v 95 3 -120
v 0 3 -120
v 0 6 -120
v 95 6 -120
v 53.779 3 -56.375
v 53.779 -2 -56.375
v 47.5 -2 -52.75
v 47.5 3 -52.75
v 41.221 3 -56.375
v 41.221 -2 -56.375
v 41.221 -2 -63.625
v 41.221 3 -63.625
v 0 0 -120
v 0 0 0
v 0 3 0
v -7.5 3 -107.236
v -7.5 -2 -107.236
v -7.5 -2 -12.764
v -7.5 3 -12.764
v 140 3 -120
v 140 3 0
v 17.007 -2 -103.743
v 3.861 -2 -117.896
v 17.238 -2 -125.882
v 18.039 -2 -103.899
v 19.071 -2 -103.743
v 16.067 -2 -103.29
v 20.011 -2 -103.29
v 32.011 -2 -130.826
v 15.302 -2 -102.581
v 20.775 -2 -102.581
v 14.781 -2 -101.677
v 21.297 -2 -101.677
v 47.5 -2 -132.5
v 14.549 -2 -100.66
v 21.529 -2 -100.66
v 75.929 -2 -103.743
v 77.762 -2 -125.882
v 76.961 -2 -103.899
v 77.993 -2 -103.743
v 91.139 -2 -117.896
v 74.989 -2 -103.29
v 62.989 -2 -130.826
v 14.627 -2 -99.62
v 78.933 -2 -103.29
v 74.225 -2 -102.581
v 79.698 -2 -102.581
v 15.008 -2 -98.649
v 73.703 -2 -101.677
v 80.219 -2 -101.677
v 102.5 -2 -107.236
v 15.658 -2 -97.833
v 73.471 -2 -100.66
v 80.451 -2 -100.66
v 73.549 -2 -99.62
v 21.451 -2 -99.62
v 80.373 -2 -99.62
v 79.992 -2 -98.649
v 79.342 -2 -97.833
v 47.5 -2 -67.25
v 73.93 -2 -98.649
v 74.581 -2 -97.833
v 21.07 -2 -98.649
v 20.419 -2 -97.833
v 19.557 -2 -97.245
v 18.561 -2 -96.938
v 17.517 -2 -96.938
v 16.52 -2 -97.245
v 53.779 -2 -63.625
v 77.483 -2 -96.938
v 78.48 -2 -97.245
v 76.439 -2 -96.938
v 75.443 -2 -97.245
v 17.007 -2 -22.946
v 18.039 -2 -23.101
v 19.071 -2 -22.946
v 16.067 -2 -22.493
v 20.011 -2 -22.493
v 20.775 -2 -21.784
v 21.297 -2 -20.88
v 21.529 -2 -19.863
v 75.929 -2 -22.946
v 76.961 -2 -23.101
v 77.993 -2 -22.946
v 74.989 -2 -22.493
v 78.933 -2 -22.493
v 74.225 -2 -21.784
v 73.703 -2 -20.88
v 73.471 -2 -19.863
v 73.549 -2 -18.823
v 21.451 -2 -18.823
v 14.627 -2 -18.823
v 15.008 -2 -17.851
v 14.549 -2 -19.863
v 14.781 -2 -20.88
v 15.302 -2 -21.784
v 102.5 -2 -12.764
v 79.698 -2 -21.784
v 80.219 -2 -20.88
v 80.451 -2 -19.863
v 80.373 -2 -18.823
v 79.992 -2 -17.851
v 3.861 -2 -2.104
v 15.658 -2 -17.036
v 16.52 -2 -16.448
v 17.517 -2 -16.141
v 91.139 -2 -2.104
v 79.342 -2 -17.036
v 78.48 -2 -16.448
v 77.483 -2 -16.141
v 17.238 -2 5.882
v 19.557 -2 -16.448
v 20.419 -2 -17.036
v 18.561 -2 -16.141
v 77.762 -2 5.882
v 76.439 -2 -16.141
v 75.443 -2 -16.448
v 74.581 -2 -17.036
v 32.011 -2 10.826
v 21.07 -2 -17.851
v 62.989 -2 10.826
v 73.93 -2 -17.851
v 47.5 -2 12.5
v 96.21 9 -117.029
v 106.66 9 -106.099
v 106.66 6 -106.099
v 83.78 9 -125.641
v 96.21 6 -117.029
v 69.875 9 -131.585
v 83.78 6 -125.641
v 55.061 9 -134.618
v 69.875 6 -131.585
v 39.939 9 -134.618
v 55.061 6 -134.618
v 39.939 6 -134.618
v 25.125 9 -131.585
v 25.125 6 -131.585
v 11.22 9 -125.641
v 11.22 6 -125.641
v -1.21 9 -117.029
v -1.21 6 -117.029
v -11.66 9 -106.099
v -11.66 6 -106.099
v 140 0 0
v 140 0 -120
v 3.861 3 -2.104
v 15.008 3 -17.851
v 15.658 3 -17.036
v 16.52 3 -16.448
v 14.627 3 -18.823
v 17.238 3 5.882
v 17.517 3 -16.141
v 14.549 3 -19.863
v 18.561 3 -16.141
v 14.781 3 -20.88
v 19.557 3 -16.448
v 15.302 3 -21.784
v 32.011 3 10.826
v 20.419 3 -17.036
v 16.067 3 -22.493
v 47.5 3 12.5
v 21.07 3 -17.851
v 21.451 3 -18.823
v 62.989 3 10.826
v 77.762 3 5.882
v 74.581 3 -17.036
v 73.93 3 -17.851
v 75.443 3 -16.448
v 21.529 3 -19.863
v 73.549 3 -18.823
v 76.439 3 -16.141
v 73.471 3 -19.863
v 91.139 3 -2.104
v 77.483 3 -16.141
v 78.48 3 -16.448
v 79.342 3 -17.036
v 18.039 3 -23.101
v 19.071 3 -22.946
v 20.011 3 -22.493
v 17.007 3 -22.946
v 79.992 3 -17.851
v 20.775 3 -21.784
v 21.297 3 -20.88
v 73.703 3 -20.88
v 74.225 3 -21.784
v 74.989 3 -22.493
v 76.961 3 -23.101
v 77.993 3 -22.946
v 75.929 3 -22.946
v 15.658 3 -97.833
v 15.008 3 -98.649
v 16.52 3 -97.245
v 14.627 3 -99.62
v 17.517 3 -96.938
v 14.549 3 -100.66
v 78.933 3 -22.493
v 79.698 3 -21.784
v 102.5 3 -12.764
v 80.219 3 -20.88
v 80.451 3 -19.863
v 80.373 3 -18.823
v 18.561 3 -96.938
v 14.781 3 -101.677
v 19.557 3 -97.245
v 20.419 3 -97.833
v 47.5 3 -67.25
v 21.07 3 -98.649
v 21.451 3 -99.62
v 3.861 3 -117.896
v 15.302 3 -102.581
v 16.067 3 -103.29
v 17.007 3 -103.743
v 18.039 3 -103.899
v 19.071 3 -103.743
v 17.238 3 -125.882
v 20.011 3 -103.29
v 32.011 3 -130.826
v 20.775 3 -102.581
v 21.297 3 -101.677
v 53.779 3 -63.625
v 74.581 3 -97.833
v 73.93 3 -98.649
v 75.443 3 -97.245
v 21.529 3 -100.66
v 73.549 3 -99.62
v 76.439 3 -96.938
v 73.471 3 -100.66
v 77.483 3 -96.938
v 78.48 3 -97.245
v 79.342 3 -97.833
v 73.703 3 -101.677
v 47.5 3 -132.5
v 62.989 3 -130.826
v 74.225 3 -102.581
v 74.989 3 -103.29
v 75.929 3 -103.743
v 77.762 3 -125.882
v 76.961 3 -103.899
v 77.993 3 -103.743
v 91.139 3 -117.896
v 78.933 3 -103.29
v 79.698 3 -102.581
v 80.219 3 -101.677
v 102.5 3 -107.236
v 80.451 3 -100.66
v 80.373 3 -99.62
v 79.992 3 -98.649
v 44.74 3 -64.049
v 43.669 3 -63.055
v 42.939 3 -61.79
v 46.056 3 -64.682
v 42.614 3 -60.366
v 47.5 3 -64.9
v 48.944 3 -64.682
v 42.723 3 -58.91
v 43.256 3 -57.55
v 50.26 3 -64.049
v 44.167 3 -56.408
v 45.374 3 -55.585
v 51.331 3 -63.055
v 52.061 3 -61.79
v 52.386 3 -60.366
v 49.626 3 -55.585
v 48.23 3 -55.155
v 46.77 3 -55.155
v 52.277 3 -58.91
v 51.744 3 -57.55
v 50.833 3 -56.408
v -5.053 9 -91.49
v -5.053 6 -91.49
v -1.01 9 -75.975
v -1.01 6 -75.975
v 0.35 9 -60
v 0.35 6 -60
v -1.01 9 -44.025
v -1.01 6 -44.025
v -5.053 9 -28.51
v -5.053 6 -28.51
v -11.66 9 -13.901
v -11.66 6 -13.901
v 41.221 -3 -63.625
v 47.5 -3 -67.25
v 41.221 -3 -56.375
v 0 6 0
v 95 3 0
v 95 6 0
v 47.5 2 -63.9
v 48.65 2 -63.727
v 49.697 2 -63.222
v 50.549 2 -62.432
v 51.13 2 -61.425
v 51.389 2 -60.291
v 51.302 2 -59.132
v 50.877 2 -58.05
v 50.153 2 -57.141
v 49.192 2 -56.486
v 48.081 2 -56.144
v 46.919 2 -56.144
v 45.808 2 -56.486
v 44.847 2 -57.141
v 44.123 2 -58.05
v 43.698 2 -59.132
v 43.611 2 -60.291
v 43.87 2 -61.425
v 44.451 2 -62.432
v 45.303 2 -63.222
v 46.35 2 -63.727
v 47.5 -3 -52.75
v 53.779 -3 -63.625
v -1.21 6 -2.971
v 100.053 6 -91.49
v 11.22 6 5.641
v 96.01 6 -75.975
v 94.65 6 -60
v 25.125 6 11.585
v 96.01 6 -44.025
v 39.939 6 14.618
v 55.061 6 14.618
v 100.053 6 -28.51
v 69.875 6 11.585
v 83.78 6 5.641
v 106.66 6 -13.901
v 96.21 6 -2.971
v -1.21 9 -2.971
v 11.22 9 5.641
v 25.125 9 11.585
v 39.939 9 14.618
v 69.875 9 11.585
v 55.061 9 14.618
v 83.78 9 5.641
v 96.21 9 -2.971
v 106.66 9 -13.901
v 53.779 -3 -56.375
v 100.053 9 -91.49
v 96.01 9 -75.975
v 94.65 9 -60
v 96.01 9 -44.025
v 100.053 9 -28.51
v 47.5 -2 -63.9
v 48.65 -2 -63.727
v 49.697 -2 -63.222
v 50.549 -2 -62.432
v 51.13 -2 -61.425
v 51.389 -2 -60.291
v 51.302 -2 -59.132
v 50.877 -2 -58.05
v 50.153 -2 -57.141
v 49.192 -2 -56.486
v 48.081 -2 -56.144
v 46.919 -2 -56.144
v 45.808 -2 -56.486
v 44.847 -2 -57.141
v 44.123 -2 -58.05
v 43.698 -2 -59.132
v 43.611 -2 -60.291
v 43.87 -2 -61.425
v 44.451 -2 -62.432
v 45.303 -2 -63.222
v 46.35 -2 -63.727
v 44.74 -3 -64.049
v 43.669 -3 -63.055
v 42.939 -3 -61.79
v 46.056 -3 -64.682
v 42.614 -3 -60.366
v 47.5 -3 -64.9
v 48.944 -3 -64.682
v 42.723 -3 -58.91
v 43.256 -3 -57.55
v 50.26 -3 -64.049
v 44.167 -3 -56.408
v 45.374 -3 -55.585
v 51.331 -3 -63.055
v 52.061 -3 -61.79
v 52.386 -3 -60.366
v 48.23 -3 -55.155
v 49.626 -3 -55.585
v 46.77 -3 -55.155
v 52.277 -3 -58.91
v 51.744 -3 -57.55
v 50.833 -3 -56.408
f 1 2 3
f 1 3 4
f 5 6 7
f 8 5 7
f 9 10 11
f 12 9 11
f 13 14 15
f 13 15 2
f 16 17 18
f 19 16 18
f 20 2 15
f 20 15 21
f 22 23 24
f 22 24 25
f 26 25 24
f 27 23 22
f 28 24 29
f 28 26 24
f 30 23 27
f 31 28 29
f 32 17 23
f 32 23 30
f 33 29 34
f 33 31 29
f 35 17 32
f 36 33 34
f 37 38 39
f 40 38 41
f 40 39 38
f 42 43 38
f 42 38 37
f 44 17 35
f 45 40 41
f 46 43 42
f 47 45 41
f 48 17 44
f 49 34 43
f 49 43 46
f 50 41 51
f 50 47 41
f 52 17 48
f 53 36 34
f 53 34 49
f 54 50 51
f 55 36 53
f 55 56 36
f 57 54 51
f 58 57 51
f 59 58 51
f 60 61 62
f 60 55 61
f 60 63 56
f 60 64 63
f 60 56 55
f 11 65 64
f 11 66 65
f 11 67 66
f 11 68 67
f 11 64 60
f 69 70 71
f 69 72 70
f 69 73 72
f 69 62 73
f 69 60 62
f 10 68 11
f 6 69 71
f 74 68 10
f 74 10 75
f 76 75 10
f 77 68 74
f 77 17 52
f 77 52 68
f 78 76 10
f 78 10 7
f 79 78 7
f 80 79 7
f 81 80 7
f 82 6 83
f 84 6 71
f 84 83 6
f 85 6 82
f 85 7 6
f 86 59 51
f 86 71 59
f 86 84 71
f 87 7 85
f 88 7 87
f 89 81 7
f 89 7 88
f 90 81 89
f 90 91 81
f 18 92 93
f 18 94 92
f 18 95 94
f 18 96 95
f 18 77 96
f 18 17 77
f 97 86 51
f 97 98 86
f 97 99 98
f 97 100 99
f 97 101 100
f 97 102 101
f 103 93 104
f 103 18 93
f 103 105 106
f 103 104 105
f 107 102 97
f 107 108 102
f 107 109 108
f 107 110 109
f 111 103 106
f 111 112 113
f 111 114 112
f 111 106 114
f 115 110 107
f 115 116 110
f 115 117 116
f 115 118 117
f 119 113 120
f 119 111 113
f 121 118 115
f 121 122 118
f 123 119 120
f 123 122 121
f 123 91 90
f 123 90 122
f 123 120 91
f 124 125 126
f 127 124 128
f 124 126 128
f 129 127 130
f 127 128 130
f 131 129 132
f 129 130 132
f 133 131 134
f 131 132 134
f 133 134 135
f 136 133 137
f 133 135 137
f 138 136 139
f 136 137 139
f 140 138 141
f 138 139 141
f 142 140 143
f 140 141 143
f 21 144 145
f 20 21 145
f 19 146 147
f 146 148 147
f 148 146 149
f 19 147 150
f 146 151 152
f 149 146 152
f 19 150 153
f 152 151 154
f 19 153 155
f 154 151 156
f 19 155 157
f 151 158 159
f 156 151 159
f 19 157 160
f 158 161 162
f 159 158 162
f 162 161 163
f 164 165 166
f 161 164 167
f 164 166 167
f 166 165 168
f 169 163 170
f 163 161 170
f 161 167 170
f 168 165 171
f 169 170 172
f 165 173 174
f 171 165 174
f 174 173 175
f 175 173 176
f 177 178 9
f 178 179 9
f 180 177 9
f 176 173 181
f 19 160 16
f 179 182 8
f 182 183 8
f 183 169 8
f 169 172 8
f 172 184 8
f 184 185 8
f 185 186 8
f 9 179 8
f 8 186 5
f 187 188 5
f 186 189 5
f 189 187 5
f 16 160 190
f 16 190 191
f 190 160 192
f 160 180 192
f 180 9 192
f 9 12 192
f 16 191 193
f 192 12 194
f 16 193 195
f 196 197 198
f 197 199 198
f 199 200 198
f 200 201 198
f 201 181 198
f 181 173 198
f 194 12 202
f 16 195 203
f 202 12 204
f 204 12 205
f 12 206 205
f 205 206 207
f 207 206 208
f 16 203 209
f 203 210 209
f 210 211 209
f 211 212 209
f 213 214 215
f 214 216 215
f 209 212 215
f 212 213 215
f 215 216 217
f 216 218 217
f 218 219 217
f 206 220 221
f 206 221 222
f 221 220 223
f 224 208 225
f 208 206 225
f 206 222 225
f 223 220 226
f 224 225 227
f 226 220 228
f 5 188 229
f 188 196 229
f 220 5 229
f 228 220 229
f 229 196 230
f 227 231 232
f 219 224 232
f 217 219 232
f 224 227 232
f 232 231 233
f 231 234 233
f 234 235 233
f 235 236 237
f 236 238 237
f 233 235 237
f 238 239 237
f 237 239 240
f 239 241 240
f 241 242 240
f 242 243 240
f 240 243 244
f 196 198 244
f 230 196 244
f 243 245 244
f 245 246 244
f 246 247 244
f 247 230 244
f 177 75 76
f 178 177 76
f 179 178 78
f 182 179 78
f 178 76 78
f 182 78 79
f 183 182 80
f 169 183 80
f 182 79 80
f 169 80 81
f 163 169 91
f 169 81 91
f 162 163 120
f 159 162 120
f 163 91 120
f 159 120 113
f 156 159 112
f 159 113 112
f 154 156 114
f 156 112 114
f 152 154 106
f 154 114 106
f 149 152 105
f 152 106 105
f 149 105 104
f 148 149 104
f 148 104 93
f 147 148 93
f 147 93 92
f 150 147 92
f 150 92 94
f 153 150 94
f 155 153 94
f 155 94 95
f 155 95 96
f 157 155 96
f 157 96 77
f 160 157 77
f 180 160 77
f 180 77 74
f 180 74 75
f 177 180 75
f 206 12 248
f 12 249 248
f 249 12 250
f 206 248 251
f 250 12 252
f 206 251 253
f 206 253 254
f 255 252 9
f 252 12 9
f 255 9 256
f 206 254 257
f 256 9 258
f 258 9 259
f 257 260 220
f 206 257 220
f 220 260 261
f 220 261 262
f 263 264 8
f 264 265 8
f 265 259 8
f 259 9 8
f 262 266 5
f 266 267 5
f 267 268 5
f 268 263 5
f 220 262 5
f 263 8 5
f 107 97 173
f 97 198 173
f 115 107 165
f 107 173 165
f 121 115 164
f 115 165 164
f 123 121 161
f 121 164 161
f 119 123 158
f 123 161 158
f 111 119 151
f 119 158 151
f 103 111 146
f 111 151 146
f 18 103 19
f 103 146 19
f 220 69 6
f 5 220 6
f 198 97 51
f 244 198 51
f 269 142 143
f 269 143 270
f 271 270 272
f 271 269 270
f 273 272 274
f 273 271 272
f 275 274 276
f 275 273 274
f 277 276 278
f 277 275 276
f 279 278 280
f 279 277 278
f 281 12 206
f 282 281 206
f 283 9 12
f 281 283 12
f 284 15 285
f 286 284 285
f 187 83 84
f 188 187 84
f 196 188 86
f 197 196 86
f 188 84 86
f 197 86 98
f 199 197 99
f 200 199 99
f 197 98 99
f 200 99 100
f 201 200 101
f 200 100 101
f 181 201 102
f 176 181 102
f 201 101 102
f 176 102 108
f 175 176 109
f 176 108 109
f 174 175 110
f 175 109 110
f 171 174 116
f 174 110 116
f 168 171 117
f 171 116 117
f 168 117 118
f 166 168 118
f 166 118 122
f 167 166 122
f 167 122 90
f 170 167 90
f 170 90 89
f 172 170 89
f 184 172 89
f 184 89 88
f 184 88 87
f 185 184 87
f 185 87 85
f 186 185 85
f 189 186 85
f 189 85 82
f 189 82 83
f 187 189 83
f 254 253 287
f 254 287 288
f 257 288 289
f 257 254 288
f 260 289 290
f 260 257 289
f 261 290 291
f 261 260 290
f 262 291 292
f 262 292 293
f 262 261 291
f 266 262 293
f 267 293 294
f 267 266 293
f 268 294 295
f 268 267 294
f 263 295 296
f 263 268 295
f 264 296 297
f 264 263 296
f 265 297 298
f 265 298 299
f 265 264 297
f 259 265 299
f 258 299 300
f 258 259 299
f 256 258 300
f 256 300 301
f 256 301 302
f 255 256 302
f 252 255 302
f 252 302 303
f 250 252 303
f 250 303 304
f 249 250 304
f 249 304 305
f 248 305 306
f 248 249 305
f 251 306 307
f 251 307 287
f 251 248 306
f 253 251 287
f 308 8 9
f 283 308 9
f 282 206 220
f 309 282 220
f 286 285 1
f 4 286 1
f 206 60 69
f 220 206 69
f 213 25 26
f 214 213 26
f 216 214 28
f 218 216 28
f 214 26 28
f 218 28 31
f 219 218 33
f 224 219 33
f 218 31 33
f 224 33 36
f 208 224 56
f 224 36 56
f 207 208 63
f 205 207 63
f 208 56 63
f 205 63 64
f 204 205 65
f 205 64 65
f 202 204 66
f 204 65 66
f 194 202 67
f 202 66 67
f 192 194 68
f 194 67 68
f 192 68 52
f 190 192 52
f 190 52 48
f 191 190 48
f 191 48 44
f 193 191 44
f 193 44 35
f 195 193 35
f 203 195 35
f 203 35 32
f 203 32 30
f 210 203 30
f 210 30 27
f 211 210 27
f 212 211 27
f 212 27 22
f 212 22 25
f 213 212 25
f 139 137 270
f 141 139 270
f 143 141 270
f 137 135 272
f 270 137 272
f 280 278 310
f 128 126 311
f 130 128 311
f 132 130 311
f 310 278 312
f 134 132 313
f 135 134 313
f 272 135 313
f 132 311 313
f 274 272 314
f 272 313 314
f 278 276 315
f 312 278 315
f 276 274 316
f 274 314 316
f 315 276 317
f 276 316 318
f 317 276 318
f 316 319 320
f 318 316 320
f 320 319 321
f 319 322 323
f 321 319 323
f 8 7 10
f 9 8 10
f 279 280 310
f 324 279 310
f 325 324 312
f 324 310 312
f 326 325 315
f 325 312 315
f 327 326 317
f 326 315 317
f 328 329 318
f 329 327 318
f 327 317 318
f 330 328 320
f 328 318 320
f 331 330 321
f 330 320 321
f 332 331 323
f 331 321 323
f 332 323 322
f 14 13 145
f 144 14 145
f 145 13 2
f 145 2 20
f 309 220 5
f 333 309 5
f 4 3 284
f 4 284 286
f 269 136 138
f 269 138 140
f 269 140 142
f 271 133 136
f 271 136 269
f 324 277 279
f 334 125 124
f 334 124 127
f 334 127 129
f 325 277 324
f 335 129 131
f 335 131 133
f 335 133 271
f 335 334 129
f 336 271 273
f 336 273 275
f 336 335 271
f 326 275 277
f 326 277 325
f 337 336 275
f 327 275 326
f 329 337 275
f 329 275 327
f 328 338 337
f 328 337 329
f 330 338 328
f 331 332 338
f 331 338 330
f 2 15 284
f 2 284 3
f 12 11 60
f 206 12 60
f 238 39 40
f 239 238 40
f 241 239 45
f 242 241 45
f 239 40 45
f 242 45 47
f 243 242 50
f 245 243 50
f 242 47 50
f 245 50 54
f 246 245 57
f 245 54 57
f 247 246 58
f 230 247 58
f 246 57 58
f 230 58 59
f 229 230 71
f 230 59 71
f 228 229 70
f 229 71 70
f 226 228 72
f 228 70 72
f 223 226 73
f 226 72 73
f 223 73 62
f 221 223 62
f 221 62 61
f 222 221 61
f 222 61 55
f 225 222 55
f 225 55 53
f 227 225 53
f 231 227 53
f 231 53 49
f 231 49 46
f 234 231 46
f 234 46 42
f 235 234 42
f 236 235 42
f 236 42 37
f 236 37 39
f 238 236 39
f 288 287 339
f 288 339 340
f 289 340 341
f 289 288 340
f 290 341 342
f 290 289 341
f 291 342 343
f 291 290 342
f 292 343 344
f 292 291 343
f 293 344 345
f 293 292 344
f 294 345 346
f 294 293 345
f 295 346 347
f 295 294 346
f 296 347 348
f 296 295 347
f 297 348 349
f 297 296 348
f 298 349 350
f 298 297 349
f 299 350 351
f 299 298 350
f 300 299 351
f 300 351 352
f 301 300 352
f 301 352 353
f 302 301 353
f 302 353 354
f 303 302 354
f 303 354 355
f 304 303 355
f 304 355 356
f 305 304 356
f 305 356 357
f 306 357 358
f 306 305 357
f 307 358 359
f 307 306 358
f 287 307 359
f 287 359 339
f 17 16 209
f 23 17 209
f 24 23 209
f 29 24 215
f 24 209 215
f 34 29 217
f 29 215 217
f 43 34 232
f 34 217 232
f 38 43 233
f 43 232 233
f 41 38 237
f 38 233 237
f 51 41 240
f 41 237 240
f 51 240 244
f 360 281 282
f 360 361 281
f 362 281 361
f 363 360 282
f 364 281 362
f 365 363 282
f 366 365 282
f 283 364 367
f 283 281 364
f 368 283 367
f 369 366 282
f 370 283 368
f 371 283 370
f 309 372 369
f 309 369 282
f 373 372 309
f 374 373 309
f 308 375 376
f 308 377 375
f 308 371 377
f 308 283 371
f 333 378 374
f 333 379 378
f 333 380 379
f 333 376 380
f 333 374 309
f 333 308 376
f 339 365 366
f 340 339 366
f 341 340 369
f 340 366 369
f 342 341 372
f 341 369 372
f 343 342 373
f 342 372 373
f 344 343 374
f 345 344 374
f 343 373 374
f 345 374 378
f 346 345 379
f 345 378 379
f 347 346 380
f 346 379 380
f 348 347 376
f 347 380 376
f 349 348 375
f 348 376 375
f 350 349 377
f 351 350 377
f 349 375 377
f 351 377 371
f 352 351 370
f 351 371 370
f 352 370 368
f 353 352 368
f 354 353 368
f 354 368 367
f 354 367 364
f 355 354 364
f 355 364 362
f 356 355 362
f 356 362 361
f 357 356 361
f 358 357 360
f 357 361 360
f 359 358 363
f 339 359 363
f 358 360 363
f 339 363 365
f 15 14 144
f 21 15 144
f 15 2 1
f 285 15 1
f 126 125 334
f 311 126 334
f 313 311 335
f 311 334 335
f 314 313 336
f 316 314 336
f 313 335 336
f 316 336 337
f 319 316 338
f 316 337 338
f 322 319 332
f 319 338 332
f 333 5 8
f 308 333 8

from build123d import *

# Parameters (mm, degrees)
SKETCH1_W                   = 140
SKETCH1_H                   = 120
COMPACT_DEPTH               = 3
SKETCH4_W                   = 95
SKETCH4_H                   = 120
SUPERCOMPACT_DEPTH          = 3
SKETCH7_R                   = 75
APPLE_BASE_DEPTH            = 3
SIDECUTS_DEPTH              = 195.694632694
APPLE_BASE_2_DEPTH          = 3
BOSS_EXTRUDE4_DEPTH         = 3
BASE_PLATE_FILLET_R         = 0.001
TOP_BOTTOM_EXTENSIONS_DEPTH = 3
SKETCH35_R                  = 1.25
SPACERHOLES_DEPTH           = 10
CUT_EXTRUDE4_DEPTH          = 10
SKETCH39_R                  = 72.5
SKETCH39_R_2                = 1.25
BOSS_EXTRUDE5_DEPTH         = 5
CUT_EXTRUDE5_DEPTH          = 150
SKETCH41_R                  = 8.4
CUT_EXTRUDE6_DEPTH          = 10
SKETCH45_R                  = 3.5
CUT_EXTRUDE8_DEPTH          = 12
SKETCH46_R                  = 3.5
CUT_EXTRUDE9_DEPTH          = 10
SKETCH47_R                  = 3.321159562
SKETCH47_R_2                = 3.023678144
SKETCH47_R_3                = 2.802634086
SKETCH47_R_4                = 2.486557649
BOSS_EXTRUDE6_DEPTH         = 5
SKETCH48_R                  = 12.079747328
BOSS_EXTRUDE7_DEPTH         = 5
CUT_EXTRUDE10_DEPTH         = 5
CUT_EXTRUDE11_DEPTH         = 10
BOSS_EXTRUDE9_DEPTH         = 1
BOSS_EXTRUDE9_DEPTH_BACK    = 5
SKETCH52_R                  = 3.9
CHAMFER1_SIZE               = 1
CHAMFER2_SIZE               = 1


with BuildPart() as part:
    # Sketch1 → Compact (new body)
    with BuildSketch(Plane(origin=(0, 0, 0), x_dir=(1, 0, 0), z_dir=(0, 1, 0))):
        with Locations((70, 60)):
            Rectangle(SKETCH1_W, SKETCH1_H)
    extrude(amount=COMPACT_DEPTH)


with BuildPart() as body_2:
    # Sketch4 → SuperCompact (new body)
    with BuildSketch(Plane(origin=(0, 3, 0), x_dir=(1, 0, 0), z_dir=(0, 1, 0))):
        with Locations((47.5, 60)):
            Rectangle(SKETCH4_W, SKETCH4_H)
    extrude(amount=SUPERCOMPACT_DEPTH)


with BuildPart() as body_3:
    # Sketch7 → Apple Base (new body)
    with BuildSketch(Plane(origin=(0, 6, 0), x_dir=(1, 0, 0), z_dir=(0, 1, 0))):
        with Locations(Location((47.5, 60, 0), (0, 0, 270))):
            Circle(SKETCH7_R)
    extrude(amount=APPLE_BASE_DEPTH)

    # Sketch8 → SideCuts (cut, through all)
    with BuildSketch(Plane(origin=(0, 9, 0), x_dir=(1, 0, 0), z_dir=(0, 1, 0))):
        with BuildLine():
            ThreePointArc((-11.66, 106.098746187), (0.350007958, 60), (-11.66, 13.901253813))
            ThreePointArc((-11.66, 13.901253813), (-27.5, 60), (-11.66, 106.098746187))
        make_face()
        with BuildLine():
            ThreePointArc((106.66, 106.098746187), (94.649992042, 60), (106.66, 13.901253813))
            ThreePointArc((106.66, 13.901253813), (122.5, 60), (106.66, 106.098746187))
        make_face()
    extrude(amount=-SIDECUTS_DEPTH, mode=Mode.SUBTRACT)


with BuildPart() as body_4:
    # Sketch9 → Apple_Base 2 (new body)
    with BuildSketch(Plane.XZ.offset(-6)):
        with BuildLine():
            ThreePointArc((106.66, -13.901253813), (47.5, 15), (-11.66, -13.901253813))
            ThreePointArc((-11.66, -13.901253813), (0.350007958, -60), (-11.66, -106.098746187))
            ThreePointArc((-11.66, -106.098746187), (47.5, -135), (106.66, -106.098746187))
            ThreePointArc((106.66, -106.098746187), (94.649992042, -60), (106.66, -13.901253813))
        make_face()
    extrude(amount=APPLE_BASE_2_DEPTH)

    # Sketch10 → Boss-Extrude4 (add)
    with BuildSketch(Plane(origin=(0, 6, 0), x_dir=(1, 0, 0), z_dir=(0, 1, 0))):
        with BuildLine():
            Line((-11.66, 106.098746187), (-11.66, 13.901253813))
            ThreePointArc((-11.66, 13.901253813), (0.350007958, 60), (-11.66, 106.098746187))
        make_face()
        with BuildLine():
            Line((106.66, 106.098746187), (106.66, 13.901253813))
            ThreePointArc((106.66, 13.901253813), (94.649992042, 60), (106.66, 106.098746187))
        make_face()
    extrude(amount=-BOSS_EXTRUDE4_DEPTH)

    # Base_Plate_Fillet
    base_plate_fillet_edges = [body_4.edges().sort_by_distance(p)[0] for p in [
        (-11.66, 3, -60),
        (-11.66, 6, -60),
        (47.5, 3, -135),
        (106.66, 3, -60),
        (106.66, 6, -60),
        (47.5, 6, -135),
        (47.5, 6, 15),
        (106.66, 4.5, -106.098746187),
        (-11.66, 4.5, -106.098746187),
        (-11.66, 4.5, -13.901253813),
        (106.66, 4.5, -13.901253813),
        (47.5, 3, 15),
    ]]
    fillet(base_plate_fillet_edges, radius=BASE_PLATE_FILLET_R)

    # Sketch25 → Top Bottom extensions (add)
    with BuildSketch(Plane(origin=(0, 6, 0), x_dir=(1, 0, 0), z_dir=(0, 1, 0))):
        with BuildLine():
            Line((-11.659005821, 106.097402592), (-11.659005821, 111.097402592))
            ThreePointArc((-11.659005821, 111.097402592), (47.5, 138.794628322), (106.659005821, 111.097402592))
            Line((106.659005821, 111.097402592), (106.659005821, 106.097402592))
            ThreePointArc((106.659005821, 106.097402592), (47.5, 133.794628322), (-11.659005821, 106.097402592))
        make_face()
        with BuildLine():
            Line((106.659005821, 13.902597408), (106.659005821, 8.902597408))
            ThreePointArc((106.659005821, 8.902597408), (47.5, -18.794628322), (-11.659005821, 8.902597408))
            Line((-11.659005821, 8.902597408), (-11.659005821, 13.902597408))
            ThreePointArc((-11.659005821, 13.902597408), (47.5, -13.794628322), (106.659005821, 13.902597408))
        make_face()
    extrude(amount=-TOP_BOTTOM_EXTENSIONS_DEPTH)

    # Sketch35 → SpacerHoles (cut)
    with BuildSketch(Plane.XZ.offset(-3)):
        with Locations(Location((7.5, -5.15, 0), (0, 0, 270))):
            Circle(SKETCH35_R)
        with Locations(Location((87.5, -5.15, 0), (0, 0, 270))):
            Circle(SKETCH35_R)
        with Locations(Location((87.5, -114.85, 0), (0, 0, 270))):
            Circle(SKETCH35_R)
        with Locations(Location((7.5, -114.85, 0), (0, 0, 270))):
            Circle(SKETCH35_R)
    extrude(amount=-SPACERHOLES_DEPTH, mode=Mode.SUBTRACT)

    # Sketch38 → Cut-Extrude4 (cut)
    with BuildSketch(Plane.XZ.offset(-3)):
        Polygon((47.5, 37.050137759), (120.372278362, 37.050137759), (120.372278362, -158.601845129), (-29.177494987, -158.601845129), (-29.177494987, 37.050137759), align=None)
        Polygon((-6.659, -60), (-6.659, 24.702355976), (101.659, 24.702355976), (101.659, -143.843523469), (-6.659, -143.843523469), align=None, mode=Mode.SUBTRACT)
    extrude(amount=-CUT_EXTRUDE4_DEPTH, mode=Mode.SUBTRACT)

    # Sketch39 → Boss-Extrude5 (add)
    with BuildSketch(Plane.XZ.offset(-3)):
        with Locations(Location((47.5, -60, 0), (0, 0, 41.667044295))):
            Circle(SKETCH39_R)
        with Locations(Location((87.5, -5.15, 0), (0, 0, 270))):
            Circle(SKETCH39_R_2, mode=Mode.SUBTRACT)
        with Locations(Location((7.5, -5.15, 0), (0, 0, 270))):
            Circle(SKETCH39_R_2, mode=Mode.SUBTRACT)
        with Locations(Location((7.5, -114.85, 0), (0, 0, 270))):
            Circle(SKETCH39_R_2, mode=Mode.SUBTRACT)
        with Locations(Location((87.5, -114.85, 0), (0, 0, 270))):
            Circle(SKETCH39_R_2, mode=Mode.SUBTRACT)
    extrude(amount=BOSS_EXTRUDE5_DEPTH)

    # Sketch40 → Cut-Extrude5 (cut)
    with BuildSketch(Plane(origin=(101.659, 0, 0), x_dir=(0, 0, -1), z_dir=(1, 0, 0))):
        Polygon((3.460058054, 3), (-22.733784582, 3), (-22.733784582, 8.214035789), (147.50303534, 8.214035789), (147.50303534, 3), align=None)
    extrude(amount=-CUT_EXTRUDE5_DEPTH, mode=Mode.SUBTRACT)

    # Sketch41 → Cut-Extrude6 (cut)
    with BuildSketch(Plane(origin=(0, 3, 0), x_dir=(1, 0, 0), z_dir=(0, 1, 0))):
        with Locations(Location((47.5, 60, 0), (0, 0, 270))):
            Circle(SKETCH41_R)
    extrude(amount=-CUT_EXTRUDE6_DEPTH, mode=Mode.SUBTRACT)

    # Sketch45 → Cut-Extrude8 (cut)
    with BuildSketch(Plane.XZ.offset(2)):
        with Locations(Location((76.961112303, -100.398550245, 0), (0, 0, 270))):
            Circle(SKETCH45_R)
        with Locations(Location((18.038887697, -100.398550245, 0), (0, 0, 270))):
            Circle(SKETCH45_R)
        with Locations(Location((18.038887697, -19.601449755, 0), (0, 0, 270))):
            Circle(SKETCH45_R)
    extrude(amount=-CUT_EXTRUDE8_DEPTH, mode=Mode.SUBTRACT)

    # Sketch46 → Cut-Extrude9 (cut)
    with BuildSketch(Plane.XZ.offset(2)):
        with Locations(Location((76.961112303, -19.601449755, 0), (0, 0, 270))):
            Circle(SKETCH46_R)
    extrude(amount=-CUT_EXTRUDE9_DEPTH, mode=Mode.SUBTRACT)

    # Sketch47 → Boss-Extrude6 (add)
    with BuildSketch(Plane.XZ.offset(2)):
        with Locations((7.5, -5.15)):
            Circle(SKETCH47_R)
        with Locations((87.5, -5.15)):
            Circle(SKETCH47_R_2)
        with Locations((87.5, -114.85)):
            Circle(SKETCH47_R_3)
        with Locations((7.5, -114.85)):
            Circle(SKETCH47_R_4)
    extrude(amount=-BOSS_EXTRUDE6_DEPTH)

    # Sketch48 → Boss-Extrude7 (add)
    with BuildSketch(Plane.XZ.offset(2)):
        with Locations((47.5, -60)):
            Circle(SKETCH48_R)
    extrude(amount=-BOSS_EXTRUDE7_DEPTH)

    # Sketch49 → Cut-Extrude10 (cut)
    with BuildSketch(Plane.XZ.offset(2)):
        Polygon((47.5, -52.75), (41.221315823, -56.375), (41.221315823, -63.625), (47.5, -67.25), (53.778684177, -63.625), (53.778684177, -56.375), align=None)
    extrude(amount=-CUT_EXTRUDE10_DEPTH, mode=Mode.SUBTRACT)

    # Sketch51 → Cut-Extrude11 (cut)
    with BuildSketch(Plane.XZ.offset(2)):
        with BuildLine():
            Line((-7.5, -107.236109069), (-7.5, -60))
            Line((-7.5, -60), (-7.5, -12.763890931))
            ThreePointArc((-7.5, -12.763890931), (-25, -60), (-7.5, -107.236109069))
        make_face()
        with BuildLine():
            Line((102.5, -12.763890931), (102.5, -60))
            Line((102.5, -60), (102.5, -107.236109069))
            ThreePointArc((102.5, -107.236109069), (115.484373204, -85.1868021), (120, -60))
            ThreePointArc((120, -60), (115.484373204, -34.8131979), (102.5, -12.763890931))
        make_face()
    extrude(amount=-CUT_EXTRUDE11_DEPTH, mode=Mode.SUBTRACT)


with BuildPart() as body_5:
    # Sketch52 → Boss-Extrude9 (new, two sides: drawn at the far end of the back side and taken through both)
    with BuildSketch(Plane.XZ.offset(2).offset(-BOSS_EXTRUDE9_DEPTH_BACK)):
        Polygon((53.778684177, -56.375), (47.5, -52.75), (41.221315823, -56.375), (41.221315823, -63.625), (47.5, -67.25), (53.778684177, -63.625), align=None)
        with Locations(Location((47.5, -60, 0), (0, 0, 270))):
            Circle(SKETCH52_R, mode=Mode.SUBTRACT)
    extrude(amount=BOSS_EXTRUDE9_DEPTH + BOSS_EXTRUDE9_DEPTH_BACK)

    # Chamfer1
    chamfer1_edges = [body_5.edges().sort_by_distance(p)[0] for p in [
        (47.5, -3, -56.1),
    ]]
    chamfer(chamfer1_edges, length=CHAMFER1_SIZE)

    # Chamfer2
    chamfer2_edges = [body_5.edges().sort_by_distance(p)[0] for p in [
        (47.5, 3, -56.1),
    ]]
    chamfer(chamfer2_edges, length=CHAMFER2_SIZE)


solid = Compound([part.part, body_2.part, body_3.part, body_4.part, body_5.part])
